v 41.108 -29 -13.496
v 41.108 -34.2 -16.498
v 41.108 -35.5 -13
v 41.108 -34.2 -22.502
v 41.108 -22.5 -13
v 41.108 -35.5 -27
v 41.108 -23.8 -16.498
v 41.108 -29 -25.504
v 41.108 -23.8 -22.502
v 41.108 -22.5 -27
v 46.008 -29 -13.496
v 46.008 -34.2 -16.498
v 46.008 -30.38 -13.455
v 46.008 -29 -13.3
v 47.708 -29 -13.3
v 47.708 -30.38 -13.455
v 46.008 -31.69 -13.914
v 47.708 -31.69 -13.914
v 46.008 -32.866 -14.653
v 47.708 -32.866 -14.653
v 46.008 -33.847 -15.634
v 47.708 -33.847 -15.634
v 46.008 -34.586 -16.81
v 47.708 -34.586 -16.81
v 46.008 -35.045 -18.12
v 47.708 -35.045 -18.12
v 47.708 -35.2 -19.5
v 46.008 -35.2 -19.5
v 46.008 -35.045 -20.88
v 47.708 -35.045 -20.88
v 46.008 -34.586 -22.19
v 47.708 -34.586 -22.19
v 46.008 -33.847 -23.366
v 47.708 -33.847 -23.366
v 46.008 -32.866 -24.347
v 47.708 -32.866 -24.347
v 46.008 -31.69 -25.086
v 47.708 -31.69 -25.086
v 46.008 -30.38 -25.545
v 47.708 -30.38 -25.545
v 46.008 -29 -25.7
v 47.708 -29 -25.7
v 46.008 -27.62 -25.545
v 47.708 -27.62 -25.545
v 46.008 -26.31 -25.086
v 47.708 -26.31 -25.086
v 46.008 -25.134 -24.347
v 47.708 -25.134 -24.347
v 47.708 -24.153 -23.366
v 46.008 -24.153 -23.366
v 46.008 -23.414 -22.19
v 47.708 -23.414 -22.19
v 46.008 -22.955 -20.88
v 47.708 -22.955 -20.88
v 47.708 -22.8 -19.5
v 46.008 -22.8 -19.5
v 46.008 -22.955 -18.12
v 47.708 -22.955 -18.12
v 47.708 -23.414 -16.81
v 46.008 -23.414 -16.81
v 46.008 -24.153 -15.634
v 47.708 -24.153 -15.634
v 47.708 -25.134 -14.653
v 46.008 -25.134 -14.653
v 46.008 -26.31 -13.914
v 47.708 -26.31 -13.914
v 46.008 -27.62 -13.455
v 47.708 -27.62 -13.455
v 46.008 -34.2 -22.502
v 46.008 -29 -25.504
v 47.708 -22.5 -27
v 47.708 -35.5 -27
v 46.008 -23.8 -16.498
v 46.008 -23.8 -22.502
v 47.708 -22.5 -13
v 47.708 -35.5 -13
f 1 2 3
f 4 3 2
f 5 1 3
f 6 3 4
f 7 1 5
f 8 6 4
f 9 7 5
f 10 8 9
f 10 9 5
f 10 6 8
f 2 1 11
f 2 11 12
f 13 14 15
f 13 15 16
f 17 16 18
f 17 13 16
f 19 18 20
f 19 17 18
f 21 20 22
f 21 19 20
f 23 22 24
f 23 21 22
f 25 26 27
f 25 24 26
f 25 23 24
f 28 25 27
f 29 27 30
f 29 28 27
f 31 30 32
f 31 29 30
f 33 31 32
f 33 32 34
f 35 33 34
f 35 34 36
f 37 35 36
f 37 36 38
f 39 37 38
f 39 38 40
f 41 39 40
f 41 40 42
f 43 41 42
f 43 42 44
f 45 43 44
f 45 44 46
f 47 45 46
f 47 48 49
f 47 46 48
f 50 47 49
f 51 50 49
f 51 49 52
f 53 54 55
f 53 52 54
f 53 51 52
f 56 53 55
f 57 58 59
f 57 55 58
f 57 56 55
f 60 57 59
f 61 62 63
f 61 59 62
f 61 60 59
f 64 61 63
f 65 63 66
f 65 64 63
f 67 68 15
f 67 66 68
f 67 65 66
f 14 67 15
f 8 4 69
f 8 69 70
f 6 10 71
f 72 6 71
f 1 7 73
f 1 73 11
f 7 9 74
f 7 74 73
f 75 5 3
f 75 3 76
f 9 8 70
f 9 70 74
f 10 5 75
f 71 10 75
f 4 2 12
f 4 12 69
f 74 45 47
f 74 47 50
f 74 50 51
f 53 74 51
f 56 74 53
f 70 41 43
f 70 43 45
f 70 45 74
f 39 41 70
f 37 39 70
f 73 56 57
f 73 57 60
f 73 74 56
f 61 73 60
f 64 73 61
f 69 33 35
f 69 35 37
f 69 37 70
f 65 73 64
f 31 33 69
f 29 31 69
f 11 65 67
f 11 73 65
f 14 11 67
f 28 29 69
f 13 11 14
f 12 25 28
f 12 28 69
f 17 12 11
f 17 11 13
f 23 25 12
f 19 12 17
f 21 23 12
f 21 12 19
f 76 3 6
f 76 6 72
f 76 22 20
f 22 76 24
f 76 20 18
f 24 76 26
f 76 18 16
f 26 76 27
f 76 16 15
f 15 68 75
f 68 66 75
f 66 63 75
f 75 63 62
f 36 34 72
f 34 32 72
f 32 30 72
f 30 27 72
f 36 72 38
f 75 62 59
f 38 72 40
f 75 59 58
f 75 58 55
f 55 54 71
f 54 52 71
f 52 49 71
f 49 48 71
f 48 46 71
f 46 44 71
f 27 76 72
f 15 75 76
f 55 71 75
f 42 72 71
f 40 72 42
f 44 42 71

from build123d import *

# Parameters (mm, degrees)
NUT_CLIP_BLANK_SKETCH_W     = 6.6
NUT_CLIP_BLANK_SKETCH_H     = 13
NUT_CLIP_BLANK_DEPTH        = 14
M6_NUT_CLEARANCE_DEPTH      = 5.3
LOAD_WASHER_RELIEF_SKETCH_R = 6.2
LOAD_WASHER_RELIEF_DEPTH    = 1.9


with BuildPart() as part:
    # Nut clip blank sketch → Nut clip blank (new body)
    with BuildSketch(Plane.XY.offset(-27)):
        with Locations((44.408348754, -29)):
            Rectangle(NUT_CLIP_BLANK_SKETCH_W, NUT_CLIP_BLANK_SKETCH_H)
    extrude(amount=NUT_CLIP_BLANK_DEPTH)

    # M6 nut clearance sketch → M6 nut clearance (cut)
    with BuildSketch(Plane(origin=(41.008348754, 0, 0), x_dir=(0, 0, -1), z_dir=(1, 0, 0))):
        Polygon((16.4977786, -23.8), (13.4955572, -29), (16.4977786, -34.2), (22.5022214, -34.2), (25.5044428, -29), (22.5022214, -23.8), align=None)
    extrude(amount=M6_NUT_CLEARANCE_DEPTH, mode=Mode.SUBTRACT)

    # Load washer relief sketch → Load washer relief (cut)
    with BuildSketch(Plane(origin=(46.008348754, 0, 0), x_dir=(0, 0, -1), z_dir=(1, 0, 0))):
        with Locations(Location((19.5, -29, 0), (0, 0, 180))):
            Circle(LOAD_WASHER_RELIEF_SKETCH_R)
    extrude(amount=LOAD_WASHER_RELIEF_DEPTH, mode=Mode.SUBTRACT)


solid = part.part
